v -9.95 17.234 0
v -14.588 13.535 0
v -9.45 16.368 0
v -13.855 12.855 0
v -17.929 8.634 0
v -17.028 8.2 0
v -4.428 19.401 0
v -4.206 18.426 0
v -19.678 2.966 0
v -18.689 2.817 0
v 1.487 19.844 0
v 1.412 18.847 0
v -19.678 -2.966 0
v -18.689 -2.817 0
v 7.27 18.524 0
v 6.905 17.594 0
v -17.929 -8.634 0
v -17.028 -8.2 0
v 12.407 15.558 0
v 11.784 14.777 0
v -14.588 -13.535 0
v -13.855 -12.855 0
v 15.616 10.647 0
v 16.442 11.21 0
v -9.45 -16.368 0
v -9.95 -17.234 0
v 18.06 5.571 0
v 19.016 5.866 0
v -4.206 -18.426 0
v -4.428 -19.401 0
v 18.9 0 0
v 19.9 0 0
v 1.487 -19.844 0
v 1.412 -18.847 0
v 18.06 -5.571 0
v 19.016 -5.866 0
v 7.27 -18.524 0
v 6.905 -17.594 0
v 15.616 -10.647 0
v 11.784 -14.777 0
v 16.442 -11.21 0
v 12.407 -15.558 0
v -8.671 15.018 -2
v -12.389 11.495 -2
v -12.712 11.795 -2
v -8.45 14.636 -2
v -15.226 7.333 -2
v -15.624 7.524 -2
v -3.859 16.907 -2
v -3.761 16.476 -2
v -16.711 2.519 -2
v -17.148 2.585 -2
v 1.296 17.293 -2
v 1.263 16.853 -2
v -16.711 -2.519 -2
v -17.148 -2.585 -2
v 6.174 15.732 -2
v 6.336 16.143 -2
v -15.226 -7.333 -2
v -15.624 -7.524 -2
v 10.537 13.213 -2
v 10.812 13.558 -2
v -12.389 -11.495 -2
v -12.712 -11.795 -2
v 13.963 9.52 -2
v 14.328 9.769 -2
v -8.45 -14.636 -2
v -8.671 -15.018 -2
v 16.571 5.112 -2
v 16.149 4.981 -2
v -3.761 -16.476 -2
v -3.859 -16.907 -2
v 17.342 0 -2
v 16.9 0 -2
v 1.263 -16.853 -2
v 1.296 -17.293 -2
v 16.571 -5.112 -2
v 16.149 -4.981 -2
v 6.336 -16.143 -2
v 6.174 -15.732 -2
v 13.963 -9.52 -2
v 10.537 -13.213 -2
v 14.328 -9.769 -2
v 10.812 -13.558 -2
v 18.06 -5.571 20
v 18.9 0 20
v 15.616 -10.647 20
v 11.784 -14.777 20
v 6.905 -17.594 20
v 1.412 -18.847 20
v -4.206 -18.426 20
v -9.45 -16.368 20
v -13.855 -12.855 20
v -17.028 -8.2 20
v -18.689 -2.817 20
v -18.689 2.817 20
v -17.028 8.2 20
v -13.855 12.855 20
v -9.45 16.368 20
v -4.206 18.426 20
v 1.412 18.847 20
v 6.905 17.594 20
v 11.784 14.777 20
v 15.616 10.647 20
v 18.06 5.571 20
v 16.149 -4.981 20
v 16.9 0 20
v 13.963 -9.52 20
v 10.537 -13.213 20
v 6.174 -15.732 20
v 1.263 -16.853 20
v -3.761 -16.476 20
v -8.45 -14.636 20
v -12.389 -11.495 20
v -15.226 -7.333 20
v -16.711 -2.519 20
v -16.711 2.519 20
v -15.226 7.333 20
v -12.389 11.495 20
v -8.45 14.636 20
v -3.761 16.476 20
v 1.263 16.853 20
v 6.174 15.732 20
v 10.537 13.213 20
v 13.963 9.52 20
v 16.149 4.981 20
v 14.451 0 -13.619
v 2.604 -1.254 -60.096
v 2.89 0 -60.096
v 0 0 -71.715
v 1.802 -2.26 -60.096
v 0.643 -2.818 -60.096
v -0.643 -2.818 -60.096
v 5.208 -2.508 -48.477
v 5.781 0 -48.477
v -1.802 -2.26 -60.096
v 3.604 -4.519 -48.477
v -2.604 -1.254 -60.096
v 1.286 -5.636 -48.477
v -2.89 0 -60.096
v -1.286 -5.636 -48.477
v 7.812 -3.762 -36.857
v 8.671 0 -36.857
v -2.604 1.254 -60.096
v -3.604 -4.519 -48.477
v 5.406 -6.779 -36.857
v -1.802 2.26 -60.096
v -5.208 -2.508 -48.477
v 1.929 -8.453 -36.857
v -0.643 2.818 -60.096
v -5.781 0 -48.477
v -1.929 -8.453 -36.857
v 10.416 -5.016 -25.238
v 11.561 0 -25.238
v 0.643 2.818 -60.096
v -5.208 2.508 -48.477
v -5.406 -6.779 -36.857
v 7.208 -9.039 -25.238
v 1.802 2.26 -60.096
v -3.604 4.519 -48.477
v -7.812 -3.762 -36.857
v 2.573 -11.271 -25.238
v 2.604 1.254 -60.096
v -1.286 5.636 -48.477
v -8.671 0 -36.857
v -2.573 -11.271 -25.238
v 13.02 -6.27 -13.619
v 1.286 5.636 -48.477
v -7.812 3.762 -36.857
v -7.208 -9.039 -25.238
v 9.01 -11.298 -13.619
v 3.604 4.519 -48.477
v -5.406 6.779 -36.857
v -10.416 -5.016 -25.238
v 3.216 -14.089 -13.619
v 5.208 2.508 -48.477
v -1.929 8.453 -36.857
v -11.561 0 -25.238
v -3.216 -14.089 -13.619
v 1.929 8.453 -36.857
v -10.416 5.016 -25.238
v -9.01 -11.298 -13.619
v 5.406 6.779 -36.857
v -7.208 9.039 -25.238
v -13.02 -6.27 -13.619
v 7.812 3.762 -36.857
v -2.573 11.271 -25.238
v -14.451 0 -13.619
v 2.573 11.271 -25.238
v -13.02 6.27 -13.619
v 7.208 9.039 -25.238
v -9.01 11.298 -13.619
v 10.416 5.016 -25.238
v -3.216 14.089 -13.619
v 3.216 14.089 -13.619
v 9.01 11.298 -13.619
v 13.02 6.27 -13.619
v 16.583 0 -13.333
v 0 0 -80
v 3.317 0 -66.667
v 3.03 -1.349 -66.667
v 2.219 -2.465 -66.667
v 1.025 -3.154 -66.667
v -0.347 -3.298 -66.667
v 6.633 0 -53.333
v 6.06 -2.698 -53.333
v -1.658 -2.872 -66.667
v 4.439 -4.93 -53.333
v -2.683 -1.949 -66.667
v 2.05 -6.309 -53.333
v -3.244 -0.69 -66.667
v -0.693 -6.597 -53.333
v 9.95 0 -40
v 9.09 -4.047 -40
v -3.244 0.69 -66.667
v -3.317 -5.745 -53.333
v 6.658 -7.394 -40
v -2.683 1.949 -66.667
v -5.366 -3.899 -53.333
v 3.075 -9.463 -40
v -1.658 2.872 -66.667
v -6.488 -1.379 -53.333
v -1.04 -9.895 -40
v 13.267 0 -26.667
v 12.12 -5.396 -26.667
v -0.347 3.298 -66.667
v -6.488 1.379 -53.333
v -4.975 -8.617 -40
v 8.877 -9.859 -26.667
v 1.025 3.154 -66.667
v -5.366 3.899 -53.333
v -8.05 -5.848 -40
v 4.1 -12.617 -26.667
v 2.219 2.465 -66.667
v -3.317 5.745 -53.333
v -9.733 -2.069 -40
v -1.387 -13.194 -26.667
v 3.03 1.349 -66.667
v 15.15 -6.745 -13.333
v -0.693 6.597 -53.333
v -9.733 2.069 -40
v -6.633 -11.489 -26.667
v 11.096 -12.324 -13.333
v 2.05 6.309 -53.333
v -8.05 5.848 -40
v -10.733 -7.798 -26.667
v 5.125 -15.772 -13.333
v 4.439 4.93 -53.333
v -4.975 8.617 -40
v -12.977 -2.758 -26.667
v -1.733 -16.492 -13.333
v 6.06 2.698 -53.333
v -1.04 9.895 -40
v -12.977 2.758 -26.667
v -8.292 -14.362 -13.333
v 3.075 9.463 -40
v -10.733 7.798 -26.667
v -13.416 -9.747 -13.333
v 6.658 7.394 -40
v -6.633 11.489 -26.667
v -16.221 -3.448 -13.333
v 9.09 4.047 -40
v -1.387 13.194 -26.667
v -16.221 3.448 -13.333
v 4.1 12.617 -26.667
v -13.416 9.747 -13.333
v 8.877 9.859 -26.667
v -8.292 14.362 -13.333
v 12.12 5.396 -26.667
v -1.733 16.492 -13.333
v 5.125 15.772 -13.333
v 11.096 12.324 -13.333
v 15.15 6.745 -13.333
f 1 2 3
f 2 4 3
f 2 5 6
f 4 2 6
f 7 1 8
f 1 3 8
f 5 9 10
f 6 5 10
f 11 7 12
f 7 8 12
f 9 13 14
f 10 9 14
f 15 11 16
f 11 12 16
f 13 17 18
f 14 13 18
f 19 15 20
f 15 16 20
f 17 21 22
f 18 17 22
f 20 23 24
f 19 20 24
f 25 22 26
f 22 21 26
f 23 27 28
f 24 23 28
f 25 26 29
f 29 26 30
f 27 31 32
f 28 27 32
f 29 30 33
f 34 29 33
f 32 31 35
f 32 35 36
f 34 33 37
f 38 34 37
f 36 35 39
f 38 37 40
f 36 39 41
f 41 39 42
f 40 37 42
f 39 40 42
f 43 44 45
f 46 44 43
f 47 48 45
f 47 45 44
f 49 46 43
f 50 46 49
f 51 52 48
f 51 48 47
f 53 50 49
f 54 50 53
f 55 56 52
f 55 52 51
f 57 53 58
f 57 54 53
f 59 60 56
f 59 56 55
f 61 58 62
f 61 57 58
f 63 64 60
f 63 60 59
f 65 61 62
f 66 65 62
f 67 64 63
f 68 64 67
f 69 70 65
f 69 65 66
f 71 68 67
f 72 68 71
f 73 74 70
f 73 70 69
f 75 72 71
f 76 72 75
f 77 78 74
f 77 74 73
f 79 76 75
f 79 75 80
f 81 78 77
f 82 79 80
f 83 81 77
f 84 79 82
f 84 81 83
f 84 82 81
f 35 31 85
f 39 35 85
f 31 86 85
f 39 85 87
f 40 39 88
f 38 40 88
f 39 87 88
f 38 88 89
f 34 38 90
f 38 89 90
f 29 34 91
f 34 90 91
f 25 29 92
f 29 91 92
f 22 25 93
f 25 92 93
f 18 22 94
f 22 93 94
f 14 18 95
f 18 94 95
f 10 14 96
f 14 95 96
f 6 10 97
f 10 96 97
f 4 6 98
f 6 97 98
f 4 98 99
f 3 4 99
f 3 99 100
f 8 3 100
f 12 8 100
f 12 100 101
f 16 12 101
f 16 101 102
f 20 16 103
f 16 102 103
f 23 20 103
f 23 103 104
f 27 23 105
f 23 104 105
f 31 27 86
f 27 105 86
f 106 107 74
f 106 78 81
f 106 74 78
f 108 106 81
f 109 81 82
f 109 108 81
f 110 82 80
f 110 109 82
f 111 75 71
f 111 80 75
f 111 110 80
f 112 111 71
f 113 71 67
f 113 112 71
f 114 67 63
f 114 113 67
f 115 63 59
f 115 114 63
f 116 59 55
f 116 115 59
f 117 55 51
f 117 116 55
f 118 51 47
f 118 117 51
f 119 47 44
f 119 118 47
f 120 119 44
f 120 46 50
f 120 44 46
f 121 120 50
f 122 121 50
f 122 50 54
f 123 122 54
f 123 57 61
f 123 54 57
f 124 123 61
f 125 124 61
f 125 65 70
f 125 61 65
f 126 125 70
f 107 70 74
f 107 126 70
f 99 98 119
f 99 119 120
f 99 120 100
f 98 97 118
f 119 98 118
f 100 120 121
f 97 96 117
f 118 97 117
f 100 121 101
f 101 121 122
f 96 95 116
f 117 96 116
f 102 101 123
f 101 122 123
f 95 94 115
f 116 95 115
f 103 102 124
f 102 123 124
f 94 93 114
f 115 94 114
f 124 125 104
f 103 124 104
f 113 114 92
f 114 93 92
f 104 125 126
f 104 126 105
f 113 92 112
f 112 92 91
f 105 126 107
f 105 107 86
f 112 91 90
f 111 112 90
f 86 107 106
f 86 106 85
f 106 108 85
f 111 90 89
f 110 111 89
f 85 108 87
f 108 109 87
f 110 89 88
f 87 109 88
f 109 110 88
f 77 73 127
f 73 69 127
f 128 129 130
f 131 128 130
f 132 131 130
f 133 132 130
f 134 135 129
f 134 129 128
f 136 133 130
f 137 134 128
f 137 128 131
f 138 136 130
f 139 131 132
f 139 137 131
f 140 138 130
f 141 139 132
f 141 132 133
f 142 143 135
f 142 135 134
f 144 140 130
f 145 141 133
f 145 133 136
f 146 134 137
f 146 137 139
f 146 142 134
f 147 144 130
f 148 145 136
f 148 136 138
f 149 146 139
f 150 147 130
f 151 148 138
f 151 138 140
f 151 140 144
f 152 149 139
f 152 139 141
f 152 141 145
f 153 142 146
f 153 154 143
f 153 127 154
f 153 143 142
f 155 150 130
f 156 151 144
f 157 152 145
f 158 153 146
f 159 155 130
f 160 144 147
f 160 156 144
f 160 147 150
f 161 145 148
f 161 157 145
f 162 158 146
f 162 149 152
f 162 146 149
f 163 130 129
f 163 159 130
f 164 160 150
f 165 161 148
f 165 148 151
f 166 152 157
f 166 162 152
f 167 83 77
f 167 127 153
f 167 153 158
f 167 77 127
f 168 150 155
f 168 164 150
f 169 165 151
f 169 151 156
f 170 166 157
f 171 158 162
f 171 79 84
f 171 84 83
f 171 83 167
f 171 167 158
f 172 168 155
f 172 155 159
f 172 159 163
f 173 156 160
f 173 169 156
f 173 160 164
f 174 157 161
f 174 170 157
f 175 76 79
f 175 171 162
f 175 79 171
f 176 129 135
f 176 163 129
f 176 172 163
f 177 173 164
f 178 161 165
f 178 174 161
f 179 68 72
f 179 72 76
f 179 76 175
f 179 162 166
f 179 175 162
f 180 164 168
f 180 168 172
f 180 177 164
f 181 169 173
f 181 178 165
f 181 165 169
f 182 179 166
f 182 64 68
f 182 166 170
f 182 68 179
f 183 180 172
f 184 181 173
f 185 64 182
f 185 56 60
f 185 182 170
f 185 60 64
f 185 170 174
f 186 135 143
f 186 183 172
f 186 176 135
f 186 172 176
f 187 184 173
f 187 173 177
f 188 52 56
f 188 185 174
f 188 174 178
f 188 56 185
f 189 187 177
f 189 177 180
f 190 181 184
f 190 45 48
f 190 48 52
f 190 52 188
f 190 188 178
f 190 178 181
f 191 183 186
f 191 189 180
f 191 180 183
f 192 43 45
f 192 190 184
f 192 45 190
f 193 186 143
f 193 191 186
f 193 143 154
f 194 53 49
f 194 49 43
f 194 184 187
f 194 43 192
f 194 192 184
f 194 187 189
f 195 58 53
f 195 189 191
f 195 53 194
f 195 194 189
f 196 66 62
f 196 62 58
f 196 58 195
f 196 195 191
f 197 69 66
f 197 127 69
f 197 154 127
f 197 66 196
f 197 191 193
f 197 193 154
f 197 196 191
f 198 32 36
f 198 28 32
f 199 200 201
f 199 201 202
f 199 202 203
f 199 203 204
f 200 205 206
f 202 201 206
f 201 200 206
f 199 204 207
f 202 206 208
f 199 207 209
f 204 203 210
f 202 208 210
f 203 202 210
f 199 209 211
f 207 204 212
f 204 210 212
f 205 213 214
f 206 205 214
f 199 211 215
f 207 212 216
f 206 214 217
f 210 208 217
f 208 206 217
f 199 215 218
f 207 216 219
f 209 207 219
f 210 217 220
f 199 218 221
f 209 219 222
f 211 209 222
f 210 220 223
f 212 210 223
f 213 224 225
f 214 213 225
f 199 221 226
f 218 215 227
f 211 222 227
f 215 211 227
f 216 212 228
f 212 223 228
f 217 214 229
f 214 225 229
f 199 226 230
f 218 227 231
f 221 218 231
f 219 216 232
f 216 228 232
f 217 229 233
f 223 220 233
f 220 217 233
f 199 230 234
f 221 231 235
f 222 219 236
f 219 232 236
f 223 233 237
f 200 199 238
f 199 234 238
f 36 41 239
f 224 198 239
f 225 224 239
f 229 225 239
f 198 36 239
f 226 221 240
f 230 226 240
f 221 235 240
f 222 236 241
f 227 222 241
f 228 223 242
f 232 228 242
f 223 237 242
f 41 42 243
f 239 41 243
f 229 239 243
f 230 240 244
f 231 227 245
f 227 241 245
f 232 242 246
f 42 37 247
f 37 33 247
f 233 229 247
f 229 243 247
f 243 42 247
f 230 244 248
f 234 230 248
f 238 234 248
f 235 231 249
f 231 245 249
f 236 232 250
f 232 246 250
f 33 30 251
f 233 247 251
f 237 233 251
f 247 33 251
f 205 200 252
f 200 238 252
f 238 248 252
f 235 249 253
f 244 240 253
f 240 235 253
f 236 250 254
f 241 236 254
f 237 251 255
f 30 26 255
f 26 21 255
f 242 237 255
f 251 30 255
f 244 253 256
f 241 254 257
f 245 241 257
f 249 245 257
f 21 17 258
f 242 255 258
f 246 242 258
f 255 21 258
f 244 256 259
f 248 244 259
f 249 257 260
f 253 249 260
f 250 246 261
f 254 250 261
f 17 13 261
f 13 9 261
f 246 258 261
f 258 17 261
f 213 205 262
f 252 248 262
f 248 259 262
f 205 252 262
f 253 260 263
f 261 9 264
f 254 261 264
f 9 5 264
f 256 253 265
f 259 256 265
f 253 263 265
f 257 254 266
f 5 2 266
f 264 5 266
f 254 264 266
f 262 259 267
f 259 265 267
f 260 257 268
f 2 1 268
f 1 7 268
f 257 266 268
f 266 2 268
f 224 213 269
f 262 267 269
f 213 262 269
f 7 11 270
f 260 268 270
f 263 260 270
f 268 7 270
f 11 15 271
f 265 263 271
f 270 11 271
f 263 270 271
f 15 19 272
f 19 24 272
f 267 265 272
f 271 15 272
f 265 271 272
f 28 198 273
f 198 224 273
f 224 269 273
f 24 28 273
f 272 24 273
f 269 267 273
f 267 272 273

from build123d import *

# Parameters (mm, degrees)
SHELL_1_T = -2


with BuildPart() as part:
    # Эскиз1 → Повернуть1 (revolve)
    with BuildSketch(Plane(origin=(0, 0, 0), x_dir=(1, 0, 0), z_dir=(0, 1, 0)), mode=Mode.PRIVATE) as revolve_1_sk:
        Polygon((0, 80), (-19.9, 0), (-18.9, 0), (-18.9, -20), (-17.643663556, -20), (0, -20), align=None)
    revolve(revolve_1_sk.sketch.rotate(Axis((0, 0, 20), (0, 0, -1)), 180), axis=Axis((0, 0, 20), (0, 0, -1)))

    # Оболочка1
    shell_1_openings = [part.faces().sort_by_distance(p)[0] for p in [
        (0, 0, 20),
    ]]
    offset(amount=SHELL_1_T, openings=shell_1_openings, kind=Kind.INTERSECTION)


solid = part.part
